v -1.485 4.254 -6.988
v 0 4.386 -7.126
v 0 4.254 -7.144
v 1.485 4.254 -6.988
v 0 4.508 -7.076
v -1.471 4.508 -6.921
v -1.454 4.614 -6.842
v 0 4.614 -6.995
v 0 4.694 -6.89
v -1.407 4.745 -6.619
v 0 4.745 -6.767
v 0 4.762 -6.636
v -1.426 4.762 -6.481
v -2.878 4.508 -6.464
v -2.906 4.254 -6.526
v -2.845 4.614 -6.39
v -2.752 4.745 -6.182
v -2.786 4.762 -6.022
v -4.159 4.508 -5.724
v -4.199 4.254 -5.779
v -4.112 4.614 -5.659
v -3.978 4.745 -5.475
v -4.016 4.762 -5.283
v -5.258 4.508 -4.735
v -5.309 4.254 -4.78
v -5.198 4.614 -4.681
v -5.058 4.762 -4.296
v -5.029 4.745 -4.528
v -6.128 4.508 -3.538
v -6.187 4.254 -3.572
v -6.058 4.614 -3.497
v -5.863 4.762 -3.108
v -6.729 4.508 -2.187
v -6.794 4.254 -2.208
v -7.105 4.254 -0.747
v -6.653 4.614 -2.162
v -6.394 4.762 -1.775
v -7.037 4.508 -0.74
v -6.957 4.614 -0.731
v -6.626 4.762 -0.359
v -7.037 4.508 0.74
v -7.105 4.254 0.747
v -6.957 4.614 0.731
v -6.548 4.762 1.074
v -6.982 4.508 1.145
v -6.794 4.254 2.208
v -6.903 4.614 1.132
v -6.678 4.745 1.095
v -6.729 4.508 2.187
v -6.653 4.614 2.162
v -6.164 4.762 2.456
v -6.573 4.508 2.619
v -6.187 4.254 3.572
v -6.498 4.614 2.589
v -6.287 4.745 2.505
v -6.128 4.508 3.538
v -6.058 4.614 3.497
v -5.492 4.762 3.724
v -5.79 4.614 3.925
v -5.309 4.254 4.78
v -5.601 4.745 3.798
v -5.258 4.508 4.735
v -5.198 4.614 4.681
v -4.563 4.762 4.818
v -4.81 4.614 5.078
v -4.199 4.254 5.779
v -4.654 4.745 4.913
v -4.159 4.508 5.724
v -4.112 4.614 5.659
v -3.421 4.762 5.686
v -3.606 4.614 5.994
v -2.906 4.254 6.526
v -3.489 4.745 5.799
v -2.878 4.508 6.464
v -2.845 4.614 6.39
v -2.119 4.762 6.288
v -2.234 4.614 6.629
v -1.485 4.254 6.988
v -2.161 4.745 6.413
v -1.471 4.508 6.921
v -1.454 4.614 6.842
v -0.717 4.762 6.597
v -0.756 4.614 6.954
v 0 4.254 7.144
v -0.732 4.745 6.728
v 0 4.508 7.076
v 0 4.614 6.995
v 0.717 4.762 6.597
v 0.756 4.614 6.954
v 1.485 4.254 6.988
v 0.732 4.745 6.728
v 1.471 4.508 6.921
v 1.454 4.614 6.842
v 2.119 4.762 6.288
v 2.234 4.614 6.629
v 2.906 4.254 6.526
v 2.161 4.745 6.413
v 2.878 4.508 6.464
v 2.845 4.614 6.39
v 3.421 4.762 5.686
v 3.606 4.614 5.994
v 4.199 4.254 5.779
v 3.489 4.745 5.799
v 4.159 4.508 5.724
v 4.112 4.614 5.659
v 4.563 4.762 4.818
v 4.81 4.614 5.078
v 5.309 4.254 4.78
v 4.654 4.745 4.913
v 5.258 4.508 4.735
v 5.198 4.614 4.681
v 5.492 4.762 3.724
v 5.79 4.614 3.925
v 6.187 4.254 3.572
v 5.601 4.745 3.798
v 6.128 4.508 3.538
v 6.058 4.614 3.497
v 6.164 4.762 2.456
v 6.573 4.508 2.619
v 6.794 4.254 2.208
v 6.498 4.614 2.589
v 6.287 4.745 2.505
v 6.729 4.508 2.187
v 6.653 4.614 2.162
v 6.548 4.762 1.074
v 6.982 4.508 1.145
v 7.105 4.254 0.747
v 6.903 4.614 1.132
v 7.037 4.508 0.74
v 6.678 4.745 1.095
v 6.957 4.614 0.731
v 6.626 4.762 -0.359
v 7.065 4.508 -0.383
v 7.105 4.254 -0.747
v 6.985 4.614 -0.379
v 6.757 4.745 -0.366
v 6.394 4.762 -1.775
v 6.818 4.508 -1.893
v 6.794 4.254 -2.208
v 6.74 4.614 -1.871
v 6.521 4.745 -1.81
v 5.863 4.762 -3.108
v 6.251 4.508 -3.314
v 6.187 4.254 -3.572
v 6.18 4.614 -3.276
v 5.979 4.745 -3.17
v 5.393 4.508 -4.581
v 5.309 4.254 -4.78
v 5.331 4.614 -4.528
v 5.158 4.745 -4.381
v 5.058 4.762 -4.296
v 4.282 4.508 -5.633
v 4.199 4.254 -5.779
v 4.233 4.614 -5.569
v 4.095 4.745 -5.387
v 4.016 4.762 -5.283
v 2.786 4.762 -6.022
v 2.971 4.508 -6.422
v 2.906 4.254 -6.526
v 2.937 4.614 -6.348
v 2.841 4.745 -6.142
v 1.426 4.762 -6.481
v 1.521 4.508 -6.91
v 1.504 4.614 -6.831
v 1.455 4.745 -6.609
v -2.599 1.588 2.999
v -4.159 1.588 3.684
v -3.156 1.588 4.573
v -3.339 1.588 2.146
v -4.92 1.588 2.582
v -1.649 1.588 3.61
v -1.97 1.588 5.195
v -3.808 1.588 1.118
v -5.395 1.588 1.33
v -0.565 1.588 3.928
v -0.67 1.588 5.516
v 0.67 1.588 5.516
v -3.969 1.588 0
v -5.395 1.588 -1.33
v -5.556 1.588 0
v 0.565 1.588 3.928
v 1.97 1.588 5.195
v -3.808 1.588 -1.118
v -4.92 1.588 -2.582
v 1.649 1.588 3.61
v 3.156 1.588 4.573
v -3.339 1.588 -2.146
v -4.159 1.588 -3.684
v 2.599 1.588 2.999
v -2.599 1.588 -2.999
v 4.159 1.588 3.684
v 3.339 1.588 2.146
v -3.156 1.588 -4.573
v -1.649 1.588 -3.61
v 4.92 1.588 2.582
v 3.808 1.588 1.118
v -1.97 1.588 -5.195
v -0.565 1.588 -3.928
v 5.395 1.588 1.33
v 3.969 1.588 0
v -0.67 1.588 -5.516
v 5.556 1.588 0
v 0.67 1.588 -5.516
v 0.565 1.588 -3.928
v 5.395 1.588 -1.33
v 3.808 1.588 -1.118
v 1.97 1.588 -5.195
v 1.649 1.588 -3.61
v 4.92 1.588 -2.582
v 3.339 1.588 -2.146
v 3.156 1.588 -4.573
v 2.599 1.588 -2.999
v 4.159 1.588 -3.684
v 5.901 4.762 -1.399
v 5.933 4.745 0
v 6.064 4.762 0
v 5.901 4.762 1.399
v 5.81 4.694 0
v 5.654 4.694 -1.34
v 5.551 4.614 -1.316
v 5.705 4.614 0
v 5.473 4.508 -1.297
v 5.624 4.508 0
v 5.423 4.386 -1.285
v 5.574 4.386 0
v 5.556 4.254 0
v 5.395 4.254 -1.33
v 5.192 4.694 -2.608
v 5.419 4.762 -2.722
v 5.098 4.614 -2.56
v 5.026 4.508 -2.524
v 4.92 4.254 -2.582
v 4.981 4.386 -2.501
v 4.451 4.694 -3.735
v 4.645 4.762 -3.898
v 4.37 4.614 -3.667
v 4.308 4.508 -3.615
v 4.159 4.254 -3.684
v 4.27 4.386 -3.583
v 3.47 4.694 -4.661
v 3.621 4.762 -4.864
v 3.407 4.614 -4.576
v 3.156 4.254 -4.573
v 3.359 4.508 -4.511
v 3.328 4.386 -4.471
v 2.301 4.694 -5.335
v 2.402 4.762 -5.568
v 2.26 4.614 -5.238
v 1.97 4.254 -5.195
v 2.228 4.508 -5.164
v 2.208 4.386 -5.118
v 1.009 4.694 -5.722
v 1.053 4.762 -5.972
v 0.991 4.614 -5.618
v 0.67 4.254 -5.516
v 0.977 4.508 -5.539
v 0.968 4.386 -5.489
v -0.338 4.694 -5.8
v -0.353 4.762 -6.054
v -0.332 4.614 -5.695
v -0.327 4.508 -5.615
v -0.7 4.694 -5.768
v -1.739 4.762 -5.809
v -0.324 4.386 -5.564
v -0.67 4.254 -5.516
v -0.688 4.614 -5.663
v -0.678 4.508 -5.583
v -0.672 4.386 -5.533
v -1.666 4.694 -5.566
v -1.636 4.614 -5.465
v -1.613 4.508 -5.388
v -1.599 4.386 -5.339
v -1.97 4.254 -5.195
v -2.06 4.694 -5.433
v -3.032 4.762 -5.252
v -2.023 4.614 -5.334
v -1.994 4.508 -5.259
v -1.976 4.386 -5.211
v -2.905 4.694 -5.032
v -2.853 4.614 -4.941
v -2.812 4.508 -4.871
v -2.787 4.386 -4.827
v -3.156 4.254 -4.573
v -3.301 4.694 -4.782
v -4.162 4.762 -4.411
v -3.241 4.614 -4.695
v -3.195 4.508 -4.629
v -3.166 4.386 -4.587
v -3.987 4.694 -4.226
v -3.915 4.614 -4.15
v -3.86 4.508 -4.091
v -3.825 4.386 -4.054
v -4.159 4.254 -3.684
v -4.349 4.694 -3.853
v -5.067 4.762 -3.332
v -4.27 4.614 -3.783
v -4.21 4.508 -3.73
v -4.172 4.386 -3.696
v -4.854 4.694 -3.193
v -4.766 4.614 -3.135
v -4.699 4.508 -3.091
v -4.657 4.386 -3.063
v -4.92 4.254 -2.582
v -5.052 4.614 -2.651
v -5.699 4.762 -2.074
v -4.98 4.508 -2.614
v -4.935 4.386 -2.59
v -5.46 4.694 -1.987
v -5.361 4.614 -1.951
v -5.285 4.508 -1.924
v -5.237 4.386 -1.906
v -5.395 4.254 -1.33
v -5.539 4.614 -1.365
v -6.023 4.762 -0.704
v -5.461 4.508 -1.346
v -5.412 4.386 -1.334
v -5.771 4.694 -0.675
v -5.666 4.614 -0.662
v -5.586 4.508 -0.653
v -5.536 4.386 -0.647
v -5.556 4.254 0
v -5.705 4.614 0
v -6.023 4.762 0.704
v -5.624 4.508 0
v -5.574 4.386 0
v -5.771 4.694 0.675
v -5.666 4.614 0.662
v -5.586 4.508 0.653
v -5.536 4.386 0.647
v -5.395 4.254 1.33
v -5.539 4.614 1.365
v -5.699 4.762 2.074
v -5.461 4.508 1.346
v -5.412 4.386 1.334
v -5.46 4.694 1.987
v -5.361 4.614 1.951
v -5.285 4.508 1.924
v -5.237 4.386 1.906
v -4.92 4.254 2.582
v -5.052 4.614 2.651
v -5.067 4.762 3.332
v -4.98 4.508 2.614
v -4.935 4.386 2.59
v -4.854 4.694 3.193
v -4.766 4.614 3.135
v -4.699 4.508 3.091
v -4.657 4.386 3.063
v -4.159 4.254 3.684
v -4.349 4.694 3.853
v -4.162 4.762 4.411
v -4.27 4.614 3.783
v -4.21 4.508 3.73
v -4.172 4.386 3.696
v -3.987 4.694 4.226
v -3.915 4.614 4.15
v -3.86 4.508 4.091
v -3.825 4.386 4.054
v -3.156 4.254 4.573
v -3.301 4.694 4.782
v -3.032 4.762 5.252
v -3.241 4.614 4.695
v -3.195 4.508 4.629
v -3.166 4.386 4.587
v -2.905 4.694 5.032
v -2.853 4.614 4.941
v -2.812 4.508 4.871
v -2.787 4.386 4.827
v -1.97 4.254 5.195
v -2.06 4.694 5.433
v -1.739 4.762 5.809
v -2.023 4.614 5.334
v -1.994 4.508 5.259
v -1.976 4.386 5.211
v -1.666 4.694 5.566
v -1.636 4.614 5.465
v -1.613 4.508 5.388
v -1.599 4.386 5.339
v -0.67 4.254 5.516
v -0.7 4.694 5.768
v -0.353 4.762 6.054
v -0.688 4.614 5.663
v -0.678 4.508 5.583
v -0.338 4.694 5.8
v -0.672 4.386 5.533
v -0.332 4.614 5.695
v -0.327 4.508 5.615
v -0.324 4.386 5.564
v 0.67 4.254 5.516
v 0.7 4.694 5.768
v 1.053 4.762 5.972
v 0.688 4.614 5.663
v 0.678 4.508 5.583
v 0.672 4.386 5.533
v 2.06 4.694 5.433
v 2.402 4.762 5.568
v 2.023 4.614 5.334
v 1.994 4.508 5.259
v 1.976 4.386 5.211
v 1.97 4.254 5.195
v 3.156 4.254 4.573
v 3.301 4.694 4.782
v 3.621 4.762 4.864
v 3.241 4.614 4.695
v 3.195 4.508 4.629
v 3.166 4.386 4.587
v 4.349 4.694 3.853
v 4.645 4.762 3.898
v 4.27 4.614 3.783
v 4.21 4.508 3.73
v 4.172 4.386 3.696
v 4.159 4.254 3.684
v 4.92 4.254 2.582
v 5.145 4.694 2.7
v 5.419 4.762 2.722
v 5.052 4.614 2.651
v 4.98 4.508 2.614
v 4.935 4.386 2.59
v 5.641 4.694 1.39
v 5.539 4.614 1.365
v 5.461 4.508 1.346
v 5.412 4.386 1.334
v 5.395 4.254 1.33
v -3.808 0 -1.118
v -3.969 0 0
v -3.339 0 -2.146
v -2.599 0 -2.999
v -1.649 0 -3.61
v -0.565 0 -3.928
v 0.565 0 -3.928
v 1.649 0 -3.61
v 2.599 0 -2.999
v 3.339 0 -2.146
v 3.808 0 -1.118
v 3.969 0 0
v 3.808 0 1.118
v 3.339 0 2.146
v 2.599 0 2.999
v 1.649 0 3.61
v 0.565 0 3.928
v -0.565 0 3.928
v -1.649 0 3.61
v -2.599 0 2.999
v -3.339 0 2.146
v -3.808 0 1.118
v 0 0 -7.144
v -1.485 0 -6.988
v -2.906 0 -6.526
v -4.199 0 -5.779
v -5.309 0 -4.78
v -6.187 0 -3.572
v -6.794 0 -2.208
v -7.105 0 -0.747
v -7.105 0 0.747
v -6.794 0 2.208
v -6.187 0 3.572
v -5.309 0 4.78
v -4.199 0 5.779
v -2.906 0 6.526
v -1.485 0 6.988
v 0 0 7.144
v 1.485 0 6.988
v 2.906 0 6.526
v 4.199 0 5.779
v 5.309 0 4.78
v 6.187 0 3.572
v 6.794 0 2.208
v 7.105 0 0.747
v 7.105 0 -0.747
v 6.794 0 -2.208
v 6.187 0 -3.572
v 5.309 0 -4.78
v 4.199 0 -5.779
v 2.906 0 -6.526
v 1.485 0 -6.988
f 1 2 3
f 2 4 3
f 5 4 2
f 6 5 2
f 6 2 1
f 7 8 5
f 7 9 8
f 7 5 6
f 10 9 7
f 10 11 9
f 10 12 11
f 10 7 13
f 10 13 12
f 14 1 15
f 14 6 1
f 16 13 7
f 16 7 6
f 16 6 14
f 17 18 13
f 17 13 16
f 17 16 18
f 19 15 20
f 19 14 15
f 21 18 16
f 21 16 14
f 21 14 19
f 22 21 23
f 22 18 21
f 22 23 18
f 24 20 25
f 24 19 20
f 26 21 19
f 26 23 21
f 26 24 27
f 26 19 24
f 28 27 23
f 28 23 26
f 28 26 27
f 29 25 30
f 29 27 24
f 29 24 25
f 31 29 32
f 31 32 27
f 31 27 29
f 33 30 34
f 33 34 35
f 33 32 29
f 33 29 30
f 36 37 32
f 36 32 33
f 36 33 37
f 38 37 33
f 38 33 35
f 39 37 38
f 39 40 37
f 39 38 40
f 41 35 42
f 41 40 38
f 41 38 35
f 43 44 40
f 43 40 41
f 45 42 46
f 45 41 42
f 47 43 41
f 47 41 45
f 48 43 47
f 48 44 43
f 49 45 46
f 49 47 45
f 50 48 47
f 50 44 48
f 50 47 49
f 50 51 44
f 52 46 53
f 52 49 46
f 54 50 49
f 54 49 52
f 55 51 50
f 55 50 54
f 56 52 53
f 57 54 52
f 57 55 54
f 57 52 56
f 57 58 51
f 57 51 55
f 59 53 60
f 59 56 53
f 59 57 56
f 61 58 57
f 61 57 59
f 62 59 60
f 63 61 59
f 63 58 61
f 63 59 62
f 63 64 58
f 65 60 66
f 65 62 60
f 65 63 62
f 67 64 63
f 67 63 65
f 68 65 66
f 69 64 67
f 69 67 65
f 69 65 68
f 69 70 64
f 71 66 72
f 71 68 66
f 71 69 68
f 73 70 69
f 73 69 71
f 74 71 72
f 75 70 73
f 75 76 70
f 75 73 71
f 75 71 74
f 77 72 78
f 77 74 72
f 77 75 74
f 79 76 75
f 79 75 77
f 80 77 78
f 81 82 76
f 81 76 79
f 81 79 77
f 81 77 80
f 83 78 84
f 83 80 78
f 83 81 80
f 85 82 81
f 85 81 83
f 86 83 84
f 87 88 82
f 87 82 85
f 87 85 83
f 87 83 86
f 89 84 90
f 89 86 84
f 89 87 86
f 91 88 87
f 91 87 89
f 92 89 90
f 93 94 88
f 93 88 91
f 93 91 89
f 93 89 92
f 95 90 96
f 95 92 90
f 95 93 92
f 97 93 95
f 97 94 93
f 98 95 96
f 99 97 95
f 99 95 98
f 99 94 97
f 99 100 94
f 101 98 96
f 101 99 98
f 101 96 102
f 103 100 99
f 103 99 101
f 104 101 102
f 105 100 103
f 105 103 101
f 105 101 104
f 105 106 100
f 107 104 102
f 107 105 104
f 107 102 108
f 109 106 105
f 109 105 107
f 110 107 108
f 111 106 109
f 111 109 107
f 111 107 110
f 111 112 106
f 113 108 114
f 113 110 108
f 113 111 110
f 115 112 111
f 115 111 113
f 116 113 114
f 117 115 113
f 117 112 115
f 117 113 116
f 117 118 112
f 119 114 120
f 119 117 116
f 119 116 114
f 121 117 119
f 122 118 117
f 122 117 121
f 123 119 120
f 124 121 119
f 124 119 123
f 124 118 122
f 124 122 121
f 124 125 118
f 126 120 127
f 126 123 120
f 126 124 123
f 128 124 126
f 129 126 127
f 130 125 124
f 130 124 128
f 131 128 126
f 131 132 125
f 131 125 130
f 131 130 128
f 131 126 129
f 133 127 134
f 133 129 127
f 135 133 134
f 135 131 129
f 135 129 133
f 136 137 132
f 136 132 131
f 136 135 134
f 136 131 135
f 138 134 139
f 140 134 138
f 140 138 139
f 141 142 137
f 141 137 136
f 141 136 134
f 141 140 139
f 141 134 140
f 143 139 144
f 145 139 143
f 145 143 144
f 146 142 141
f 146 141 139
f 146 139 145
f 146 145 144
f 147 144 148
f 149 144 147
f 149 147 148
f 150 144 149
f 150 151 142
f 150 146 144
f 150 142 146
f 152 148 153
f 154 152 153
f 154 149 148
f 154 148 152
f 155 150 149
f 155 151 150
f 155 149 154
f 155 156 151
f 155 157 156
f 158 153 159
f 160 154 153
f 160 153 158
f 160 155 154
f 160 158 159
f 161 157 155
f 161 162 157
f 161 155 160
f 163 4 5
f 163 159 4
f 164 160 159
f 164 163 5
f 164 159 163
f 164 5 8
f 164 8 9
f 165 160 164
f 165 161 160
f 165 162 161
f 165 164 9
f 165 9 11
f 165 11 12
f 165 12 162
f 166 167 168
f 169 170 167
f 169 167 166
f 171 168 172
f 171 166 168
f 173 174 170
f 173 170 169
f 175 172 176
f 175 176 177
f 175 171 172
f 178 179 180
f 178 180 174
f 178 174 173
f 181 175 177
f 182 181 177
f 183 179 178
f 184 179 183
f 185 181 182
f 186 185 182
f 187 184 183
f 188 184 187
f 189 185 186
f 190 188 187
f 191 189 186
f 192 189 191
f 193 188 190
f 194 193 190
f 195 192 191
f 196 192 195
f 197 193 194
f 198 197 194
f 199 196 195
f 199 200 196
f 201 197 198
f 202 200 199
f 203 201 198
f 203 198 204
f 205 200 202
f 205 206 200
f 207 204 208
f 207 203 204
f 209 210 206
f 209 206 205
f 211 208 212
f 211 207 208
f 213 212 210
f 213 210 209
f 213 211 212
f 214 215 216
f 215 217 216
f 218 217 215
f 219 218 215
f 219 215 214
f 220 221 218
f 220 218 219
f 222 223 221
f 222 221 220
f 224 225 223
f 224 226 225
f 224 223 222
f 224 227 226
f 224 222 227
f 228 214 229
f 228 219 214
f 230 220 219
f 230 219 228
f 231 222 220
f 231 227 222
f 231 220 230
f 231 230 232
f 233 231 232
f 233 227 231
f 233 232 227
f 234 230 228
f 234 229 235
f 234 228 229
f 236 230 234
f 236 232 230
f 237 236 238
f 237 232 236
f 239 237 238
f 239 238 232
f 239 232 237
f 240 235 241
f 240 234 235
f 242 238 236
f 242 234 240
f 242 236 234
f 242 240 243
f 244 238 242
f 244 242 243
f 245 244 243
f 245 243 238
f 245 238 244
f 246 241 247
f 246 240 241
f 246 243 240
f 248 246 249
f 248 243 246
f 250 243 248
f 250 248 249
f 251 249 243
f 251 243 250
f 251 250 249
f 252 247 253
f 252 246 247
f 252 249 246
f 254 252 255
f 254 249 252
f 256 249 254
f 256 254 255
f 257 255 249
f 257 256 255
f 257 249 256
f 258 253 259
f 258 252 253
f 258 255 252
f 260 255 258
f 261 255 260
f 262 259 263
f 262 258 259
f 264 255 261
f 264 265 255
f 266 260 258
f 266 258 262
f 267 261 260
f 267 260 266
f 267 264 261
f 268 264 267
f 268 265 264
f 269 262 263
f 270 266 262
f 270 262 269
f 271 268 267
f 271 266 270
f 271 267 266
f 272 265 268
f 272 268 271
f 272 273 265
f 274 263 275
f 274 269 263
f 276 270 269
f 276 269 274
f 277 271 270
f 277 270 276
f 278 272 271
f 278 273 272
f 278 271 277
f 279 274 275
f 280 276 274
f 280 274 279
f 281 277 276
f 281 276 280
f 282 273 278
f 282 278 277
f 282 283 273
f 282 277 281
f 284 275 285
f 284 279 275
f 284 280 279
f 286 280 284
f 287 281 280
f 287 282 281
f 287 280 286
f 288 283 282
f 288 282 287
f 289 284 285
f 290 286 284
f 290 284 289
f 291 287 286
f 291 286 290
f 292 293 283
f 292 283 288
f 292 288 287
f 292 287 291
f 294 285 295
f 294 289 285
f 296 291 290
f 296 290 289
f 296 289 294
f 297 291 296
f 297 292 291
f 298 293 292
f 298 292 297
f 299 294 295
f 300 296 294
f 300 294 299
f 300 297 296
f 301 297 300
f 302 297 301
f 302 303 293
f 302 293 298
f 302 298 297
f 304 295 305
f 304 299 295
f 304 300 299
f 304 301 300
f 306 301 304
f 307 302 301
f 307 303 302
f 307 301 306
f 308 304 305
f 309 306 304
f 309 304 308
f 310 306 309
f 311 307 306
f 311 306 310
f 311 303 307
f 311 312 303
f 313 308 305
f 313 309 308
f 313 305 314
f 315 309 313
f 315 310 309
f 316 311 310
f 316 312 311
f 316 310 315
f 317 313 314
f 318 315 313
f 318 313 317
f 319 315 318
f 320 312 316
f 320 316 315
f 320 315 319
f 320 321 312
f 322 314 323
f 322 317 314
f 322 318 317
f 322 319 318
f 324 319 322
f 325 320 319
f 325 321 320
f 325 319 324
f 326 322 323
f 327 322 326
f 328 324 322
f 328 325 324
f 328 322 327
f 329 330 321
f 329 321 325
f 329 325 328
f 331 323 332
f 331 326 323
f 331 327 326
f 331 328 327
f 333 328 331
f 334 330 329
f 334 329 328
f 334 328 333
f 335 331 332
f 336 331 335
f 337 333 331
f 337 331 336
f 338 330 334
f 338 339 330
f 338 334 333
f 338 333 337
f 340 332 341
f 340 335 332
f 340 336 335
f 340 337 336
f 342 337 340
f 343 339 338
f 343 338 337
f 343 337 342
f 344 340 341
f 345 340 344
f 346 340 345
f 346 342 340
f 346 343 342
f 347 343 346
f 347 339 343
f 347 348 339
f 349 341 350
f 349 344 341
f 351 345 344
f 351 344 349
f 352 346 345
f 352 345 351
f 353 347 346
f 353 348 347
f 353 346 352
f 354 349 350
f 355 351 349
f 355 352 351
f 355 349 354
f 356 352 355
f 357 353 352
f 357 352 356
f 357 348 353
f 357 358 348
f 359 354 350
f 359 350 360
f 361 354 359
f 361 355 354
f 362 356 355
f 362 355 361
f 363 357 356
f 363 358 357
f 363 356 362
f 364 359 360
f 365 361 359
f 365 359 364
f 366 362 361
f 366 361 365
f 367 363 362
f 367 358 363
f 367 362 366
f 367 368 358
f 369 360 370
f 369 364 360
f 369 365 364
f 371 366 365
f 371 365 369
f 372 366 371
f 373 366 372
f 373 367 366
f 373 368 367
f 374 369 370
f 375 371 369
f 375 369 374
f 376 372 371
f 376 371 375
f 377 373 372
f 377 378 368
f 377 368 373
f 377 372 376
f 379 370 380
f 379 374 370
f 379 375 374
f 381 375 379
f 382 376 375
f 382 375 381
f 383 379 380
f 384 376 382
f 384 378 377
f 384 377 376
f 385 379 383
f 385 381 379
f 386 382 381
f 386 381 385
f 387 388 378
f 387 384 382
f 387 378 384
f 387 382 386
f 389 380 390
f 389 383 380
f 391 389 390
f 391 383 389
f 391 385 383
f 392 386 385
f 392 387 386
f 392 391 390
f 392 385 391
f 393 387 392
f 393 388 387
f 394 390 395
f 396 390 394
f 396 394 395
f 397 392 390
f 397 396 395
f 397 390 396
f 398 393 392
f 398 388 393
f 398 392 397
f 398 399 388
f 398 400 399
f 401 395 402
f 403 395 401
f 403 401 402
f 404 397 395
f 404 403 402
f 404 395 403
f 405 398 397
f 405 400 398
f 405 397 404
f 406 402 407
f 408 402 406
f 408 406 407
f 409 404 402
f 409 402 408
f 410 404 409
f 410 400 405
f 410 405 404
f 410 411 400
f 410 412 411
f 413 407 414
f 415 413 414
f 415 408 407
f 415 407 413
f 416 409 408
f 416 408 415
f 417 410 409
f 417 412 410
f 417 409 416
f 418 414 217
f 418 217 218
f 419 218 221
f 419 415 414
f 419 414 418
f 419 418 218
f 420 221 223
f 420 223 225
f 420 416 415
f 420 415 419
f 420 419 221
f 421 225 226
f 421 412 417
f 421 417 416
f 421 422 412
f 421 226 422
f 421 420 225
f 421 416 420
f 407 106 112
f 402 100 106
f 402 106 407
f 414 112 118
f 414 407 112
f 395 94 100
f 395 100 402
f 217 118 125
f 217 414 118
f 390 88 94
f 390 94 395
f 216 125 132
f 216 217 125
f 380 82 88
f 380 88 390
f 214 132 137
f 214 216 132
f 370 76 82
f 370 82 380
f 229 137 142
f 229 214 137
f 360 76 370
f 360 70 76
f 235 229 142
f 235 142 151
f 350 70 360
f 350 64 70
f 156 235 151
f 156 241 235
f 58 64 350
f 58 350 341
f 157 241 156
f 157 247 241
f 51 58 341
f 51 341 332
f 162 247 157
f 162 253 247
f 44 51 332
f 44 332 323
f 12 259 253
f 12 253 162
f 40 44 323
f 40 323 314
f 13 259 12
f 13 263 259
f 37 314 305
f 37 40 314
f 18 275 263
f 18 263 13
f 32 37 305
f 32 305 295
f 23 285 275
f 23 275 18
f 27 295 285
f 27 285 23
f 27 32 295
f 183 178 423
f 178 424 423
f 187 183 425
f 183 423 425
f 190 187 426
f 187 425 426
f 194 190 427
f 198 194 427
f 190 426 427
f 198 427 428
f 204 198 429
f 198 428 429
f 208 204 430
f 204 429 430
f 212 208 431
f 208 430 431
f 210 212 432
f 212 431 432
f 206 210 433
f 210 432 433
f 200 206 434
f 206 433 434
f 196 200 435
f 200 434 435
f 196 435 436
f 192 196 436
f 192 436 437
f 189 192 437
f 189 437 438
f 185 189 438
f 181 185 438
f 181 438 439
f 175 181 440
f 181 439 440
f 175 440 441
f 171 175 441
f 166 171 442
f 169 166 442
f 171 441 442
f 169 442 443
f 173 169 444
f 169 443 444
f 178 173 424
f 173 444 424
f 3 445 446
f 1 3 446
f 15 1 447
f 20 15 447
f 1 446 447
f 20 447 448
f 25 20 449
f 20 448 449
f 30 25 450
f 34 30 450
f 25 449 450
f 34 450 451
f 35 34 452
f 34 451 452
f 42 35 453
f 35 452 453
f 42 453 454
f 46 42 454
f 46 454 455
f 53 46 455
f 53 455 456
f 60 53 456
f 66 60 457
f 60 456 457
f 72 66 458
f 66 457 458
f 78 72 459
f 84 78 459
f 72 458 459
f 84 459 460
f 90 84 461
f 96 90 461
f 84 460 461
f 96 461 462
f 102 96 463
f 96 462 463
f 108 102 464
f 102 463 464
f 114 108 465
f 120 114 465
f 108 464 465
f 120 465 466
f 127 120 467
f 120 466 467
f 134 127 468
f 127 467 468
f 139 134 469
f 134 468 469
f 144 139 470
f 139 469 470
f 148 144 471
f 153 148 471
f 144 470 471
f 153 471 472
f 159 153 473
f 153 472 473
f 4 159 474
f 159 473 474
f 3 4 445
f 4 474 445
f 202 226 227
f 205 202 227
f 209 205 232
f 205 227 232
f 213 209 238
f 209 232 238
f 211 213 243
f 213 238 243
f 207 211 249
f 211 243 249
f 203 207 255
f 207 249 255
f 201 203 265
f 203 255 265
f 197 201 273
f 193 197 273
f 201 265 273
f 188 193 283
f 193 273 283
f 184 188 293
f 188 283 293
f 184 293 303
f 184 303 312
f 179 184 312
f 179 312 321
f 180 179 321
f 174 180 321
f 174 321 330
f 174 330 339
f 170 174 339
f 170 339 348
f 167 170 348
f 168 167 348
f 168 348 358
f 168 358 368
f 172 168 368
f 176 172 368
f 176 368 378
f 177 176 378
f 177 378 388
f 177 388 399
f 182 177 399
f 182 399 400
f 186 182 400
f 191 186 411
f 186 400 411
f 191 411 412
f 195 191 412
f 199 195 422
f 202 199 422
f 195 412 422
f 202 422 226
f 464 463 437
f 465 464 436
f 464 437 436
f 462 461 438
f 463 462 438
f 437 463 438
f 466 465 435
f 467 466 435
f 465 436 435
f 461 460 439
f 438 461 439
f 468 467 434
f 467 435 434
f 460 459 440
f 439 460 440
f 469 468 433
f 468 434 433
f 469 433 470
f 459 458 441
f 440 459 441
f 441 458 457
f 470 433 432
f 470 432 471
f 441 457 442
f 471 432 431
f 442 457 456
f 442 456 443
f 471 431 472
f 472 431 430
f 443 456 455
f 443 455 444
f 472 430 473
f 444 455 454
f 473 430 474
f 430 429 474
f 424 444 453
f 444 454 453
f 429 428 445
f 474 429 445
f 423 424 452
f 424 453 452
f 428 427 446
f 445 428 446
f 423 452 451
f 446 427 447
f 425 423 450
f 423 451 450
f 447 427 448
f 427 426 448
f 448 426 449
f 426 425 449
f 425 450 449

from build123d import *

# Parameters (mm, degrees)
SKETCH1_R                                           = 7.14375
BOSS_EXTRUDE1_DEPTH                                 = 4.7625
CBORE_FOR_00_BINDING_HEAD_MACHINE_SCREW_D           = 7.9375
CBORE_FOR_00_BINDING_HEAD_MACHINE_SCREW_CBORE_D     = 11.1125
CBORE_FOR_00_BINDING_HEAD_MACHINE_SCREW_CBORE_DEPTH = 3.175
FILLET2_R                                           = 0.508


with BuildPart() as part:
    # Sketch1 → Boss-Extrude1 (new body)
    with BuildSketch(Plane(origin=(0, 0, 0), x_dir=(1, 0, 0), z_dir=(0, 1, 0))):
        Circle(SKETCH1_R)
    extrude(amount=BOSS_EXTRUDE1_DEPTH)

    # CBORE for #00 Binding Head Machine Screw1 (through all)
    with Locations(Plane(origin=(0, 4.7625, 0), x_dir=(1, 0, 0), z_dir=(0, 1, 0))):
        with Locations((0, 0)):
            CounterBoreHole(CBORE_FOR_00_BINDING_HEAD_MACHINE_SCREW_D / 2, CBORE_FOR_00_BINDING_HEAD_MACHINE_SCREW_CBORE_D / 2, CBORE_FOR_00_BINDING_HEAD_MACHINE_SCREW_CBORE_DEPTH)

    # Fillet2
    fillet2_edges = [part.edges().sort_by_distance(p)[0] for p in [
        (-7.14375, 4.7625, 0),
        (-5.55625, 4.7625, 0),
    ]]
    fillet(fillet2_edges, radius=FILLET2_R)


solid = part.part
